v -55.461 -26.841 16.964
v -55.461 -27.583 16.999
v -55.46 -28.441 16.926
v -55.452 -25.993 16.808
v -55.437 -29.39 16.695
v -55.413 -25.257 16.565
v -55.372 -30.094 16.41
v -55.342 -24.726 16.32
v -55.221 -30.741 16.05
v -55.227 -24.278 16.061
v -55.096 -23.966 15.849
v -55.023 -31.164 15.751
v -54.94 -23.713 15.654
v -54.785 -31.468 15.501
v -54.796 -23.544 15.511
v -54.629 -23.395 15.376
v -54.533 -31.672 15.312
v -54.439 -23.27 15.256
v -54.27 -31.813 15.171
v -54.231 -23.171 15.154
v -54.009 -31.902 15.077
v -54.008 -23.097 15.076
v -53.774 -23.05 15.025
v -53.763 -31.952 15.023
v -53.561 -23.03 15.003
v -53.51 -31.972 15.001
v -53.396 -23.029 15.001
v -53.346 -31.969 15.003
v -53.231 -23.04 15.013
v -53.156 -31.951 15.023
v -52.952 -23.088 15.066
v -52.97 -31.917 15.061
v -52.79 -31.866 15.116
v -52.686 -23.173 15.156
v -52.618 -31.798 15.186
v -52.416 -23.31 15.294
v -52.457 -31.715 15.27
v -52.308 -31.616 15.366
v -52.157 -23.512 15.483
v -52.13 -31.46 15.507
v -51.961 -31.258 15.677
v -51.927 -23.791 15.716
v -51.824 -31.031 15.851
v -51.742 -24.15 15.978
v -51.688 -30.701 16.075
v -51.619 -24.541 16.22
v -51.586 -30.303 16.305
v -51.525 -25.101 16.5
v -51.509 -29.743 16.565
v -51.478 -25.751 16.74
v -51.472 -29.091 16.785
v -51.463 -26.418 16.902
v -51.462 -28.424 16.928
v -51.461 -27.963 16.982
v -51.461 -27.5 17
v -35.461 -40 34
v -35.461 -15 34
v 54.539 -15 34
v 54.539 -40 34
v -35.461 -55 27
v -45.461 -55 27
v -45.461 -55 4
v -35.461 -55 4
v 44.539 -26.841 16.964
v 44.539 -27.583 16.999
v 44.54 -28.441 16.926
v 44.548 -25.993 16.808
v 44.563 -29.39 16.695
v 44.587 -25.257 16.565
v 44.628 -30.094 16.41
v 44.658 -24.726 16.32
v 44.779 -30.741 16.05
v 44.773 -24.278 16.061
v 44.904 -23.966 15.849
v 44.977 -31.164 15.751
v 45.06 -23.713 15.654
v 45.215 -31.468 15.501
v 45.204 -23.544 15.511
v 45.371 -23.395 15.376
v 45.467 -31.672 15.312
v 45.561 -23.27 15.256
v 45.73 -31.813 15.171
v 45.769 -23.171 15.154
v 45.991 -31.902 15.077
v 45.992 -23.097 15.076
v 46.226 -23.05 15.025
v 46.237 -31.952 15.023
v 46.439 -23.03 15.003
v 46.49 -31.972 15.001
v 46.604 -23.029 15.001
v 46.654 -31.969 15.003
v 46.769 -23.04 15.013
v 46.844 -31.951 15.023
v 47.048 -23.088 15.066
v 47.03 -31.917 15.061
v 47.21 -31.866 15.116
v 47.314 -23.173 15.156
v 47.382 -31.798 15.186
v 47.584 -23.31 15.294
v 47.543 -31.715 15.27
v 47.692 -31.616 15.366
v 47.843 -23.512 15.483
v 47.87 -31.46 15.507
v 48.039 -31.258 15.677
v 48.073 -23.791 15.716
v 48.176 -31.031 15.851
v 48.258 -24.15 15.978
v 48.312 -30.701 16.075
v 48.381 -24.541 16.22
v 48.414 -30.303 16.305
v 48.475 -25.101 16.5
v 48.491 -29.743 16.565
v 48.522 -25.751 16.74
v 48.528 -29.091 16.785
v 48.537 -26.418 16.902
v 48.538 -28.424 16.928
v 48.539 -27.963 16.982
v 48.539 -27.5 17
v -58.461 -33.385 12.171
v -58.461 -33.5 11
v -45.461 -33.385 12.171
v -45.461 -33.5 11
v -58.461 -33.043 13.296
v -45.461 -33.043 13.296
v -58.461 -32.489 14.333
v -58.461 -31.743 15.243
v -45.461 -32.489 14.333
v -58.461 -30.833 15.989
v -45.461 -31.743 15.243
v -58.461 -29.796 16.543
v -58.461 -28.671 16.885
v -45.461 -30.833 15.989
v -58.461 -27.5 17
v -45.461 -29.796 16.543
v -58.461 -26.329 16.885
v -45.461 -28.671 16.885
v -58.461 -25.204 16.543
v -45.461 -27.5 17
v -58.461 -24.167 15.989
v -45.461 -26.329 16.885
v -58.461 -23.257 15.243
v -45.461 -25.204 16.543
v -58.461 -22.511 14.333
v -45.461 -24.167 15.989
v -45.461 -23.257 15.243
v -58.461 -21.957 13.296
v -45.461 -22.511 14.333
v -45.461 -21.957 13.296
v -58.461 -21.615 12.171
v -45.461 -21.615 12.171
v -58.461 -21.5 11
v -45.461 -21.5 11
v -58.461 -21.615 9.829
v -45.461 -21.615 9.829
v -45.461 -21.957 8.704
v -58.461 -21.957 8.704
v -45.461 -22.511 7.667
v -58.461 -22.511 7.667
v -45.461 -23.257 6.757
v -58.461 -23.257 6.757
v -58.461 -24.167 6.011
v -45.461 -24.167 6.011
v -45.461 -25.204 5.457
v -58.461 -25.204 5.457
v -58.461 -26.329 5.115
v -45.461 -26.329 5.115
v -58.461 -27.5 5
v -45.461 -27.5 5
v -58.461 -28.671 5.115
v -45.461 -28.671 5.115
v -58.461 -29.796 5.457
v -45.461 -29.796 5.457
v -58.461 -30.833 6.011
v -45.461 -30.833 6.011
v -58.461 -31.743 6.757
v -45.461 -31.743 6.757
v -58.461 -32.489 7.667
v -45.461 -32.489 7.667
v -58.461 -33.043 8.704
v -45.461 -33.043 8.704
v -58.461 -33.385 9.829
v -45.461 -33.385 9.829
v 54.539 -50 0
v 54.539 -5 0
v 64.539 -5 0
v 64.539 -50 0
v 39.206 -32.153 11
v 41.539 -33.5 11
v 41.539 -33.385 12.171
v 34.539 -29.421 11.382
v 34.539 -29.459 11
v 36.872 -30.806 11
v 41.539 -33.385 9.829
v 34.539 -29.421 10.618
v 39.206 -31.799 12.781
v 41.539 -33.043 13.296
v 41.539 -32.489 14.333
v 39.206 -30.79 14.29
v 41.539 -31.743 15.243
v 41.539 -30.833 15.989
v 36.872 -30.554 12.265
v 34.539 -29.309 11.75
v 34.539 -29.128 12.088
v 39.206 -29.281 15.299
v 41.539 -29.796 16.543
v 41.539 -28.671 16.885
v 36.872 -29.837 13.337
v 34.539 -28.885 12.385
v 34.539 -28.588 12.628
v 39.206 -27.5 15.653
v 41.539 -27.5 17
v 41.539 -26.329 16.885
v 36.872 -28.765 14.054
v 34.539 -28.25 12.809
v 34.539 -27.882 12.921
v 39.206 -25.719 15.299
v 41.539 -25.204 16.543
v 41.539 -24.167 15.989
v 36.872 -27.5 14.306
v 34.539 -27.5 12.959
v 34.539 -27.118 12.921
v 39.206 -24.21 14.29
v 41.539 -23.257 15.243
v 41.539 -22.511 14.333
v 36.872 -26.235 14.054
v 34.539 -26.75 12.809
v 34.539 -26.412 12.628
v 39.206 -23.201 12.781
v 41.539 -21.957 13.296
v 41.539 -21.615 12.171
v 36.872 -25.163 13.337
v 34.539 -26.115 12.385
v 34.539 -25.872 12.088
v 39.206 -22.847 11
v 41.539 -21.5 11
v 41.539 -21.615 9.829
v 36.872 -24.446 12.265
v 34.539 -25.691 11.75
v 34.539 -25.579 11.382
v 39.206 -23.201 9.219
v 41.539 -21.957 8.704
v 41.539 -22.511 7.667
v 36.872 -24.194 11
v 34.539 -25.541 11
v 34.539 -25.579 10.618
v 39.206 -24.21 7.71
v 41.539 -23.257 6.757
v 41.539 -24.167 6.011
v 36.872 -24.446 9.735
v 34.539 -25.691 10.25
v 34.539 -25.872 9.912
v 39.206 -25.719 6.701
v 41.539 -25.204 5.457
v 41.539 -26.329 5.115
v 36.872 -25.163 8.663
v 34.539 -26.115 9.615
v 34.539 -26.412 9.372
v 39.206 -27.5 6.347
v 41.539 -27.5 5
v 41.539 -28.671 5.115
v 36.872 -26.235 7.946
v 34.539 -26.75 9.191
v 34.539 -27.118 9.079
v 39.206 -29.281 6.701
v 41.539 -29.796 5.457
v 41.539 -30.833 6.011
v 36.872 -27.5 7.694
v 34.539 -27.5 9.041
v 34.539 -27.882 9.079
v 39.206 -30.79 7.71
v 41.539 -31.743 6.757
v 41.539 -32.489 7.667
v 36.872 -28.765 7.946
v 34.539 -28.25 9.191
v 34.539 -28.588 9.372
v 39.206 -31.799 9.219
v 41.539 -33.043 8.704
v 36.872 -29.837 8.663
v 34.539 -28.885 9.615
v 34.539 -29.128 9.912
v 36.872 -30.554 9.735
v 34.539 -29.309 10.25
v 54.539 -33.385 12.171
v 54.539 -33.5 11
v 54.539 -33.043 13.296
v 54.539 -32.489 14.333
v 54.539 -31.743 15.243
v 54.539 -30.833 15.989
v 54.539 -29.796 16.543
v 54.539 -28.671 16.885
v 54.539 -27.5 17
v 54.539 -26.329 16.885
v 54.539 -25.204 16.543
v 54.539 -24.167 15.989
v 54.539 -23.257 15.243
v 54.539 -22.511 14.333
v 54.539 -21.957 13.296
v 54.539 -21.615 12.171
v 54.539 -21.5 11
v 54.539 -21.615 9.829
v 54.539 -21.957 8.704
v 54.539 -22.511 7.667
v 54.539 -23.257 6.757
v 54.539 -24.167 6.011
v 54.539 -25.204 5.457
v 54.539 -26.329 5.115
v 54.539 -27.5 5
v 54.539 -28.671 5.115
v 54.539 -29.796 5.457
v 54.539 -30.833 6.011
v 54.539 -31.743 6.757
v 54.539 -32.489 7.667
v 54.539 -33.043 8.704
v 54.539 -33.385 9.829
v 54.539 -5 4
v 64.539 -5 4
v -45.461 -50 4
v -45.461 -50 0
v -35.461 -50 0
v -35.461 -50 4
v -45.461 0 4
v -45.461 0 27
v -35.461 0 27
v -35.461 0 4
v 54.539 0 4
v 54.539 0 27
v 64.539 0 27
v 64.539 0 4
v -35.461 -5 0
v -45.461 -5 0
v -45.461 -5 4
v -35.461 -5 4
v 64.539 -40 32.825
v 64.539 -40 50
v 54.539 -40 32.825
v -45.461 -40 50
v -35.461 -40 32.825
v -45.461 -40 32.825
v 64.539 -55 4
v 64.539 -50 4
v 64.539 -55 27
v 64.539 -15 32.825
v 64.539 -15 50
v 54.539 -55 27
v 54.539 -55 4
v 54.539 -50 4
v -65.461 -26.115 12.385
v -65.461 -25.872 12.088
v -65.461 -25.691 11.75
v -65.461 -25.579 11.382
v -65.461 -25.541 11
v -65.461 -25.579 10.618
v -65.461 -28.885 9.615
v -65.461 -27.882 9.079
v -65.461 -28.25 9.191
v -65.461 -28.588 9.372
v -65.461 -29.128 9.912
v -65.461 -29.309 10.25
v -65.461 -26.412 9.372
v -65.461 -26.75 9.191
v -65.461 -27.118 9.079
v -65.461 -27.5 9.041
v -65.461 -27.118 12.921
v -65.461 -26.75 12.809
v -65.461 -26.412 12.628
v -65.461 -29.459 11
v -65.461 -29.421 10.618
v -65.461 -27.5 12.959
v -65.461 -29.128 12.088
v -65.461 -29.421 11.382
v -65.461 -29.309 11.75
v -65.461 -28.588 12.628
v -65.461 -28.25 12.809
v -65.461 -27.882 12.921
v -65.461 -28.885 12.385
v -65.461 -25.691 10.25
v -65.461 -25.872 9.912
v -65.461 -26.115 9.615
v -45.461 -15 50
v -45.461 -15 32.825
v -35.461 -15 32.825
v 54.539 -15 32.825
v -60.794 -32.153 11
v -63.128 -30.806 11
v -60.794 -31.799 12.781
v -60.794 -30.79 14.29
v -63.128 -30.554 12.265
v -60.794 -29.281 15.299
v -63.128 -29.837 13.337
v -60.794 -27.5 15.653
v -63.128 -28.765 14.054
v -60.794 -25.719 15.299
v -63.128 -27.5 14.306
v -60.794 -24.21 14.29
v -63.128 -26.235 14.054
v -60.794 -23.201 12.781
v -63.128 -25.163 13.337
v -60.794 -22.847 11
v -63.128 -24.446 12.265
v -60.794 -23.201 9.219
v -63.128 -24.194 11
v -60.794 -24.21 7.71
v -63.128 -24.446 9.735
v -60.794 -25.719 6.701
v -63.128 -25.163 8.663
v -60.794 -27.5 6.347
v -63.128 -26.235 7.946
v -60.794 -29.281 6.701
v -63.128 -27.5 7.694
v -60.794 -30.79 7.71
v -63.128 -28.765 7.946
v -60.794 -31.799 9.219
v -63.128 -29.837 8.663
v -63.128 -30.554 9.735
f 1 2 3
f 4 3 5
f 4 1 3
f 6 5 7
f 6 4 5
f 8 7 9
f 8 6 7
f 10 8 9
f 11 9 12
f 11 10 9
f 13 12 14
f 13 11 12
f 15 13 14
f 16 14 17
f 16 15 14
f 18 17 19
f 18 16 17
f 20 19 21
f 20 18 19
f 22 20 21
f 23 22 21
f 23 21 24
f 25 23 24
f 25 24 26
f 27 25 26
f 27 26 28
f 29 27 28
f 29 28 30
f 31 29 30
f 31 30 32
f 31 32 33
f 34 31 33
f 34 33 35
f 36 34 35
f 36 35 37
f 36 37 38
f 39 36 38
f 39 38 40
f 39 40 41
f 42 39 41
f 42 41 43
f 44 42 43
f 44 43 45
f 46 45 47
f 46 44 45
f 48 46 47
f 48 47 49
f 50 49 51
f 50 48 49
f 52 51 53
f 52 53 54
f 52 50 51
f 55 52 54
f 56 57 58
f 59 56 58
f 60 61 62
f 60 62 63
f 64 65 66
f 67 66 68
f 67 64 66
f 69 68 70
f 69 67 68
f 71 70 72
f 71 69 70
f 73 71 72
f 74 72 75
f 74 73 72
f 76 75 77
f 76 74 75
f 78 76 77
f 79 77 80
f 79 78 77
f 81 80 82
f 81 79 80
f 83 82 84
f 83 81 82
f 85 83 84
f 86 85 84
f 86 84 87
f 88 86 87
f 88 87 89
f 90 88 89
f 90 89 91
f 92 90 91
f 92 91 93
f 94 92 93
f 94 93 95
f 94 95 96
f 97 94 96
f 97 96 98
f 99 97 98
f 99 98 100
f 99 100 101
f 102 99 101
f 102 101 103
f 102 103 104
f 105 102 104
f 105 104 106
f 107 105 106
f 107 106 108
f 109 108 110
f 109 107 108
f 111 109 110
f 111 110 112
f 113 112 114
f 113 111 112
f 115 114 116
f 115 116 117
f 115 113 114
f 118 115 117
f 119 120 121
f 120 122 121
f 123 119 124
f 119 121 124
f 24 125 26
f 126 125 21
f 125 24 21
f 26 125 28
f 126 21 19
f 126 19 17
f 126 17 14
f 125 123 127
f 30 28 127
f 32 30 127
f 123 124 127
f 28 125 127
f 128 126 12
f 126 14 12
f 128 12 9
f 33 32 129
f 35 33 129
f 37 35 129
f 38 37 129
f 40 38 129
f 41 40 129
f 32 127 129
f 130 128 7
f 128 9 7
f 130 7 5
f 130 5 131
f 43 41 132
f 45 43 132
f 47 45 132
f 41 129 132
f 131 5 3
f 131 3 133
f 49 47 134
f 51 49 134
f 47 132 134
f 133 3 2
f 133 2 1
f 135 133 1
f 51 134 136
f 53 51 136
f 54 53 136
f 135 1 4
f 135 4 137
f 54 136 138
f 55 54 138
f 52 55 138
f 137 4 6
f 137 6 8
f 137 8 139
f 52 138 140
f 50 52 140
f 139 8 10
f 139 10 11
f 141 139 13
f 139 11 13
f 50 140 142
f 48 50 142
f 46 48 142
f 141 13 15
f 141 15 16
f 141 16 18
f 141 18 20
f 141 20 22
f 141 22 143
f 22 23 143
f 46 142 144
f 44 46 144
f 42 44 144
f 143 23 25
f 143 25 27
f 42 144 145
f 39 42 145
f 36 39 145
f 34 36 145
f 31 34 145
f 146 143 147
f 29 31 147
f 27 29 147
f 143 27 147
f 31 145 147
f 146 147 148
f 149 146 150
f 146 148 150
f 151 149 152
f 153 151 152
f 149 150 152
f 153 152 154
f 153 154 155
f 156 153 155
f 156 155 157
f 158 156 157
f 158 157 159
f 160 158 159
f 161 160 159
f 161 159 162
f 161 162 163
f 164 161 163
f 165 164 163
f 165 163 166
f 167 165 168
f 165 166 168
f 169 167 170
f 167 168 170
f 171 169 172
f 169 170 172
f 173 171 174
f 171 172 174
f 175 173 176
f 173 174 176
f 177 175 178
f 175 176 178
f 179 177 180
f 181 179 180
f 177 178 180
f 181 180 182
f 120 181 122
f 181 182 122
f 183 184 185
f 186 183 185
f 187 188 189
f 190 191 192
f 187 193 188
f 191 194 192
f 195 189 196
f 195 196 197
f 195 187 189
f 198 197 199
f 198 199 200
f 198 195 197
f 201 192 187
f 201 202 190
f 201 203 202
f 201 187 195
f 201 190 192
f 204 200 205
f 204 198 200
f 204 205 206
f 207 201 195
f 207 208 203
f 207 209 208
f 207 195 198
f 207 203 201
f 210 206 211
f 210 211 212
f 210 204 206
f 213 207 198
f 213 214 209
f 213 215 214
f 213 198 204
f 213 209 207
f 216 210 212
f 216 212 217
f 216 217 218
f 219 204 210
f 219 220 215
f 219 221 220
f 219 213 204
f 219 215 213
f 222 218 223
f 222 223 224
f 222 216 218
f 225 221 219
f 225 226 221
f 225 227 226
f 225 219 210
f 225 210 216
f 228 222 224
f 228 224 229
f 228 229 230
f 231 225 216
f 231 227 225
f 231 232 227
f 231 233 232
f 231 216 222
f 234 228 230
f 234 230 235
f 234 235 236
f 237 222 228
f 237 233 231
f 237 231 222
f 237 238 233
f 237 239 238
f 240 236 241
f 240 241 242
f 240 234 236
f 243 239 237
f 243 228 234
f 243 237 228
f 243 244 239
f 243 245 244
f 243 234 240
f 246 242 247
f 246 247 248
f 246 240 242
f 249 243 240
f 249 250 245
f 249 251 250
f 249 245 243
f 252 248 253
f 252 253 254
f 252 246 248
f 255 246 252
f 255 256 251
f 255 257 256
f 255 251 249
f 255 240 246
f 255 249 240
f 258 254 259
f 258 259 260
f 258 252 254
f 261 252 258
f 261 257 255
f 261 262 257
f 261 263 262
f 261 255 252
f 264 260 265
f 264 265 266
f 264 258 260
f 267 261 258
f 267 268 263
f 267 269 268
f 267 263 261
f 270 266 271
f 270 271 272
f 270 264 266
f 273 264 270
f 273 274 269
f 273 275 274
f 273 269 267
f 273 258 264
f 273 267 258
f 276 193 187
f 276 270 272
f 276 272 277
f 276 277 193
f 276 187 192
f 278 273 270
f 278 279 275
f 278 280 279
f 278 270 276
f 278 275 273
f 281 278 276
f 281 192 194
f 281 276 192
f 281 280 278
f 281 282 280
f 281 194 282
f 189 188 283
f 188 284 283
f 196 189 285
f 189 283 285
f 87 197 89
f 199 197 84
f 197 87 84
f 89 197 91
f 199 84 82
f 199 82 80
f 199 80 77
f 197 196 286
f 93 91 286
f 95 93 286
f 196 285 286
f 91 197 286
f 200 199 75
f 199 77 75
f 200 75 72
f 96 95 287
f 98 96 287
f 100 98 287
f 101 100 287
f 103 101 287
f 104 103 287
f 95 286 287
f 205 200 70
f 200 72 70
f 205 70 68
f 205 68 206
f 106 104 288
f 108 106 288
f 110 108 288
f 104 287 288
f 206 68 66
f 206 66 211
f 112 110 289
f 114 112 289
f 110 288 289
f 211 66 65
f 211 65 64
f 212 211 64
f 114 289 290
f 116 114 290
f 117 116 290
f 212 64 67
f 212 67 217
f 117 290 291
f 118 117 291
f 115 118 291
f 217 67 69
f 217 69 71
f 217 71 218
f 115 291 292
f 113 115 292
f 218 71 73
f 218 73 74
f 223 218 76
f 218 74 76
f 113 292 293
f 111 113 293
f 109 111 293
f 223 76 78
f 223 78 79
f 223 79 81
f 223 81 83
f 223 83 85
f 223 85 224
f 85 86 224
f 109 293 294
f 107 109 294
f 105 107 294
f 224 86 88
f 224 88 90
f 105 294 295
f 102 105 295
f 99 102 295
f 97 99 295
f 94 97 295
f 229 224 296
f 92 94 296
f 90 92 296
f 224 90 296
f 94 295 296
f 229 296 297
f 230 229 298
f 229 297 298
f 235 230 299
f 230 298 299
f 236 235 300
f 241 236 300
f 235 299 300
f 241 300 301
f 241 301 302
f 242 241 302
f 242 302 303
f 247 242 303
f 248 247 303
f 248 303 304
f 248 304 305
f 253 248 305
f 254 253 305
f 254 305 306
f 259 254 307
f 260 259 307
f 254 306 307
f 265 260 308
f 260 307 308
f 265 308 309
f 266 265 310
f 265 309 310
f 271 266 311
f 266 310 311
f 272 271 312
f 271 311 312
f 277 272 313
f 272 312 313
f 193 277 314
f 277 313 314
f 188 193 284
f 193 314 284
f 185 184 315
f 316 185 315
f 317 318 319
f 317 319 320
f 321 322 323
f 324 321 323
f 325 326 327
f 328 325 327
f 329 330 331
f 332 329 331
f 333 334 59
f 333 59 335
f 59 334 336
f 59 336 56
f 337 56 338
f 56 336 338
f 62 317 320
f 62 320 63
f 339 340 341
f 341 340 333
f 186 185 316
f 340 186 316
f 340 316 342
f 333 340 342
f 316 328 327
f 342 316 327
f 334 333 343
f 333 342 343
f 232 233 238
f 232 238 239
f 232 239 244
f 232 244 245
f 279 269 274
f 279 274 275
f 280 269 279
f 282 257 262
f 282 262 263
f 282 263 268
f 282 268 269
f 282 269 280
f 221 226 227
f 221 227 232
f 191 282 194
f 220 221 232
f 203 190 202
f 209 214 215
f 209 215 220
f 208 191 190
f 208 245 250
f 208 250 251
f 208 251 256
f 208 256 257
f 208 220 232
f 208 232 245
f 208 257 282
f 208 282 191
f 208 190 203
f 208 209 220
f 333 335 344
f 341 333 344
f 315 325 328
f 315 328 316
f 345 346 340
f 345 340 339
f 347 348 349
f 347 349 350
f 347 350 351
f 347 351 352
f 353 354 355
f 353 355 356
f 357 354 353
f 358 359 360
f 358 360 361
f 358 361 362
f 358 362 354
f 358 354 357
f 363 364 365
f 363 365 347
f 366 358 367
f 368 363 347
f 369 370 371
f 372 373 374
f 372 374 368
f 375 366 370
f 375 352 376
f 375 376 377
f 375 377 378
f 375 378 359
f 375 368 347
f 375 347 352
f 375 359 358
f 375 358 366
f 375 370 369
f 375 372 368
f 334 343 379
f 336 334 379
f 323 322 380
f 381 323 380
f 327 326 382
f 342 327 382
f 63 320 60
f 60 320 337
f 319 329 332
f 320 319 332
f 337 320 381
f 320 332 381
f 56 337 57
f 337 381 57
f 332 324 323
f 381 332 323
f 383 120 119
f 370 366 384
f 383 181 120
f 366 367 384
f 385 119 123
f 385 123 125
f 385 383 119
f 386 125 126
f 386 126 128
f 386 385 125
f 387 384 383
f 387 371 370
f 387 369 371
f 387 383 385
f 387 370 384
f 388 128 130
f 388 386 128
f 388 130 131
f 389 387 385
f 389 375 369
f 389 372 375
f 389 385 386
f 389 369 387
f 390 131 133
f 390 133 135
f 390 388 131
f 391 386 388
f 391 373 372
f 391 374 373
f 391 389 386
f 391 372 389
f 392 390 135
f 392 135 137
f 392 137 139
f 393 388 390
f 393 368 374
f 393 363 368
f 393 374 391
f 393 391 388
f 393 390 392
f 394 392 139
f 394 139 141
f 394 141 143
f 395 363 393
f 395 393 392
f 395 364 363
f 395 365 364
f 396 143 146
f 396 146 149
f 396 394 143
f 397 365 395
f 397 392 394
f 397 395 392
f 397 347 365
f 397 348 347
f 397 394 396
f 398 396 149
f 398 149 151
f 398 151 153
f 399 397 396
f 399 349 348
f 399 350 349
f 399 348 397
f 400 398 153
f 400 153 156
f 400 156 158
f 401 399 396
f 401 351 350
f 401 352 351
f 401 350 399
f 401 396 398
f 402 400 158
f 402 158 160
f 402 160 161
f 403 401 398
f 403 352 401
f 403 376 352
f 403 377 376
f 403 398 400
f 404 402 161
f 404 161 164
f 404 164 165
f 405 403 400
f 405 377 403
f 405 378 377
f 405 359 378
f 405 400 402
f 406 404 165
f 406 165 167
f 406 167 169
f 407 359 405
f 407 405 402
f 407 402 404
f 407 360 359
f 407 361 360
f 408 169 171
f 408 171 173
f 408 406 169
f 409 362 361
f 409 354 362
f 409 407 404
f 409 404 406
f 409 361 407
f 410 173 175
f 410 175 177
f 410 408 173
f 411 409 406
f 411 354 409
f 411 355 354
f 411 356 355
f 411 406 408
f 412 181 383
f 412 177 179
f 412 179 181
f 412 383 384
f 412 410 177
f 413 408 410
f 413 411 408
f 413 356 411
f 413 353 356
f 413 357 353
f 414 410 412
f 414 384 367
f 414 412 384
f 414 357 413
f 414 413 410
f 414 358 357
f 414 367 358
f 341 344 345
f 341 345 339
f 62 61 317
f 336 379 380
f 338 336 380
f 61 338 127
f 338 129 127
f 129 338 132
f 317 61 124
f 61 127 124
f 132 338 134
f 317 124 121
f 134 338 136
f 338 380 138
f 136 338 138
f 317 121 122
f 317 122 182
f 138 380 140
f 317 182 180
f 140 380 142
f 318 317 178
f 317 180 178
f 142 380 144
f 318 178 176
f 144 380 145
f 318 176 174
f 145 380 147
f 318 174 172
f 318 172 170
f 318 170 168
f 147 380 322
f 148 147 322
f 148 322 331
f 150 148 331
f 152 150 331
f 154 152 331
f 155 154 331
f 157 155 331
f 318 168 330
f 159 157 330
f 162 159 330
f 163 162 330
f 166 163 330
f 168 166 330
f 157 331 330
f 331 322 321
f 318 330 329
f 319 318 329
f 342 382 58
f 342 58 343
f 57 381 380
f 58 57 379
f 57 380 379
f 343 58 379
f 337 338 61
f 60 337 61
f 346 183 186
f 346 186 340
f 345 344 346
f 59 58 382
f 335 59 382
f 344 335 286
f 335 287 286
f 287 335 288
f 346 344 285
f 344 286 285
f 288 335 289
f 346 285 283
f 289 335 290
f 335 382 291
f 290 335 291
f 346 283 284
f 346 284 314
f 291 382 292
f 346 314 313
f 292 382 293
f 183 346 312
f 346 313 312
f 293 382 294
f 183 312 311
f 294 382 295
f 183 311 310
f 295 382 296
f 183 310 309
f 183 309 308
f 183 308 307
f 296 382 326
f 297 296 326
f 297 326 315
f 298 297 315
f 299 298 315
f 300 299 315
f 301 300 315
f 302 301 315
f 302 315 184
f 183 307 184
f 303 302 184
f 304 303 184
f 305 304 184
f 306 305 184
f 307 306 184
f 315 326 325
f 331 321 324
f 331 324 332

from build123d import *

# Parameters (mm, degrees)
F1_DEPTH  = 55
F2_W      = 5
F2_H      = 4
F3_DEPTH  = 110.001
F4_R      = 6
F5_DEPTH  = 20
F6_R      = 6
F7_DEPTH  = 20
F9_DEPTH  = 110.001
F10_SIZE2 = 4.041452
F10_SIZE  = 7
F11_R     = 2
F12_DEPTH = 55.001


with BuildPart() as f1:
    # F0 (on Front) → F1 (new body)
    with BuildSketch(Plane.XZ):
        Polygon((-45.460895, 50), (-45.460895, 0), (-35.460895, 0), (-35.460895, 34), (54.539105, 34), (54.539105, 0), (64.539105, 0), (64.539105, 50), align=None)
    extrude(amount=F1_DEPTH)

    # F2 (on face) → F3 (cut, through all)
    with BuildSketch(Plane(origin=(-45.460895, 0, 0), x_dir=(0, -1, 0), z_dir=(-1, 0, 0))):
        with Locations((2.5, 2)):
            Rectangle(F2_W, F2_H)
        with Locations((52.5, 2)):
            Rectangle(F2_W, F2_H)
    extrude(amount=-F3_DEPTH, mode=Mode.SUBTRACT)

    # F4 (on face) → F5 (join)
    with BuildSketch(Plane(origin=(-45.460895, 0, 0), x_dir=(0, -1, 0), z_dir=(-1, 0, 0))):
        with Locations((27.5, 11)):
            Circle(F4_R)
    extrude(amount=F5_DEPTH)

    # F6 (on face) → F7 (join)
    with BuildSketch(Plane(origin=(54.539105, 0, 0), x_dir=(0, -1, 0), z_dir=(-1, 0, 0))):
        with Locations((27.5, 11)):
            Circle(F6_R)
    extrude(amount=F7_DEPTH)

    # F8 (on face) → F9 (cut, through all)
    with BuildSketch(Plane(origin=(-45.460895, 0, 0), x_dir=(0, -1, 0), z_dir=(-1, 0, 0))):
        Polygon((40, 32.825176), (55, 27), (55, 50), (40, 50), align=None)
        Polygon((15, 32.825176), (15, 50), (0, 50), (0, 27), align=None)
    extrude(amount=-F9_DEPTH, mode=Mode.SUBTRACT)

    # F10
    f10_edges = [f1.edges().sort_by_distance(p)[0] for p in [
        (-65.460895, -21.5, 11),
        (34.539105, -21.5, 11),
    ]]
    chamfer(f10_edges, length=F10_SIZE, length2=F10_SIZE2)

    # F11 (on Front) → F12 (cut, through all)
    with BuildSketch(Plane.XZ):
        with Locations((-53.460895, 17)):
            Circle(F11_R)
        with Locations((46.539105, 17)):
            Circle(F11_R)
    extrude(amount=F12_DEPTH, mode=Mode.SUBTRACT)


solid = f1.part
